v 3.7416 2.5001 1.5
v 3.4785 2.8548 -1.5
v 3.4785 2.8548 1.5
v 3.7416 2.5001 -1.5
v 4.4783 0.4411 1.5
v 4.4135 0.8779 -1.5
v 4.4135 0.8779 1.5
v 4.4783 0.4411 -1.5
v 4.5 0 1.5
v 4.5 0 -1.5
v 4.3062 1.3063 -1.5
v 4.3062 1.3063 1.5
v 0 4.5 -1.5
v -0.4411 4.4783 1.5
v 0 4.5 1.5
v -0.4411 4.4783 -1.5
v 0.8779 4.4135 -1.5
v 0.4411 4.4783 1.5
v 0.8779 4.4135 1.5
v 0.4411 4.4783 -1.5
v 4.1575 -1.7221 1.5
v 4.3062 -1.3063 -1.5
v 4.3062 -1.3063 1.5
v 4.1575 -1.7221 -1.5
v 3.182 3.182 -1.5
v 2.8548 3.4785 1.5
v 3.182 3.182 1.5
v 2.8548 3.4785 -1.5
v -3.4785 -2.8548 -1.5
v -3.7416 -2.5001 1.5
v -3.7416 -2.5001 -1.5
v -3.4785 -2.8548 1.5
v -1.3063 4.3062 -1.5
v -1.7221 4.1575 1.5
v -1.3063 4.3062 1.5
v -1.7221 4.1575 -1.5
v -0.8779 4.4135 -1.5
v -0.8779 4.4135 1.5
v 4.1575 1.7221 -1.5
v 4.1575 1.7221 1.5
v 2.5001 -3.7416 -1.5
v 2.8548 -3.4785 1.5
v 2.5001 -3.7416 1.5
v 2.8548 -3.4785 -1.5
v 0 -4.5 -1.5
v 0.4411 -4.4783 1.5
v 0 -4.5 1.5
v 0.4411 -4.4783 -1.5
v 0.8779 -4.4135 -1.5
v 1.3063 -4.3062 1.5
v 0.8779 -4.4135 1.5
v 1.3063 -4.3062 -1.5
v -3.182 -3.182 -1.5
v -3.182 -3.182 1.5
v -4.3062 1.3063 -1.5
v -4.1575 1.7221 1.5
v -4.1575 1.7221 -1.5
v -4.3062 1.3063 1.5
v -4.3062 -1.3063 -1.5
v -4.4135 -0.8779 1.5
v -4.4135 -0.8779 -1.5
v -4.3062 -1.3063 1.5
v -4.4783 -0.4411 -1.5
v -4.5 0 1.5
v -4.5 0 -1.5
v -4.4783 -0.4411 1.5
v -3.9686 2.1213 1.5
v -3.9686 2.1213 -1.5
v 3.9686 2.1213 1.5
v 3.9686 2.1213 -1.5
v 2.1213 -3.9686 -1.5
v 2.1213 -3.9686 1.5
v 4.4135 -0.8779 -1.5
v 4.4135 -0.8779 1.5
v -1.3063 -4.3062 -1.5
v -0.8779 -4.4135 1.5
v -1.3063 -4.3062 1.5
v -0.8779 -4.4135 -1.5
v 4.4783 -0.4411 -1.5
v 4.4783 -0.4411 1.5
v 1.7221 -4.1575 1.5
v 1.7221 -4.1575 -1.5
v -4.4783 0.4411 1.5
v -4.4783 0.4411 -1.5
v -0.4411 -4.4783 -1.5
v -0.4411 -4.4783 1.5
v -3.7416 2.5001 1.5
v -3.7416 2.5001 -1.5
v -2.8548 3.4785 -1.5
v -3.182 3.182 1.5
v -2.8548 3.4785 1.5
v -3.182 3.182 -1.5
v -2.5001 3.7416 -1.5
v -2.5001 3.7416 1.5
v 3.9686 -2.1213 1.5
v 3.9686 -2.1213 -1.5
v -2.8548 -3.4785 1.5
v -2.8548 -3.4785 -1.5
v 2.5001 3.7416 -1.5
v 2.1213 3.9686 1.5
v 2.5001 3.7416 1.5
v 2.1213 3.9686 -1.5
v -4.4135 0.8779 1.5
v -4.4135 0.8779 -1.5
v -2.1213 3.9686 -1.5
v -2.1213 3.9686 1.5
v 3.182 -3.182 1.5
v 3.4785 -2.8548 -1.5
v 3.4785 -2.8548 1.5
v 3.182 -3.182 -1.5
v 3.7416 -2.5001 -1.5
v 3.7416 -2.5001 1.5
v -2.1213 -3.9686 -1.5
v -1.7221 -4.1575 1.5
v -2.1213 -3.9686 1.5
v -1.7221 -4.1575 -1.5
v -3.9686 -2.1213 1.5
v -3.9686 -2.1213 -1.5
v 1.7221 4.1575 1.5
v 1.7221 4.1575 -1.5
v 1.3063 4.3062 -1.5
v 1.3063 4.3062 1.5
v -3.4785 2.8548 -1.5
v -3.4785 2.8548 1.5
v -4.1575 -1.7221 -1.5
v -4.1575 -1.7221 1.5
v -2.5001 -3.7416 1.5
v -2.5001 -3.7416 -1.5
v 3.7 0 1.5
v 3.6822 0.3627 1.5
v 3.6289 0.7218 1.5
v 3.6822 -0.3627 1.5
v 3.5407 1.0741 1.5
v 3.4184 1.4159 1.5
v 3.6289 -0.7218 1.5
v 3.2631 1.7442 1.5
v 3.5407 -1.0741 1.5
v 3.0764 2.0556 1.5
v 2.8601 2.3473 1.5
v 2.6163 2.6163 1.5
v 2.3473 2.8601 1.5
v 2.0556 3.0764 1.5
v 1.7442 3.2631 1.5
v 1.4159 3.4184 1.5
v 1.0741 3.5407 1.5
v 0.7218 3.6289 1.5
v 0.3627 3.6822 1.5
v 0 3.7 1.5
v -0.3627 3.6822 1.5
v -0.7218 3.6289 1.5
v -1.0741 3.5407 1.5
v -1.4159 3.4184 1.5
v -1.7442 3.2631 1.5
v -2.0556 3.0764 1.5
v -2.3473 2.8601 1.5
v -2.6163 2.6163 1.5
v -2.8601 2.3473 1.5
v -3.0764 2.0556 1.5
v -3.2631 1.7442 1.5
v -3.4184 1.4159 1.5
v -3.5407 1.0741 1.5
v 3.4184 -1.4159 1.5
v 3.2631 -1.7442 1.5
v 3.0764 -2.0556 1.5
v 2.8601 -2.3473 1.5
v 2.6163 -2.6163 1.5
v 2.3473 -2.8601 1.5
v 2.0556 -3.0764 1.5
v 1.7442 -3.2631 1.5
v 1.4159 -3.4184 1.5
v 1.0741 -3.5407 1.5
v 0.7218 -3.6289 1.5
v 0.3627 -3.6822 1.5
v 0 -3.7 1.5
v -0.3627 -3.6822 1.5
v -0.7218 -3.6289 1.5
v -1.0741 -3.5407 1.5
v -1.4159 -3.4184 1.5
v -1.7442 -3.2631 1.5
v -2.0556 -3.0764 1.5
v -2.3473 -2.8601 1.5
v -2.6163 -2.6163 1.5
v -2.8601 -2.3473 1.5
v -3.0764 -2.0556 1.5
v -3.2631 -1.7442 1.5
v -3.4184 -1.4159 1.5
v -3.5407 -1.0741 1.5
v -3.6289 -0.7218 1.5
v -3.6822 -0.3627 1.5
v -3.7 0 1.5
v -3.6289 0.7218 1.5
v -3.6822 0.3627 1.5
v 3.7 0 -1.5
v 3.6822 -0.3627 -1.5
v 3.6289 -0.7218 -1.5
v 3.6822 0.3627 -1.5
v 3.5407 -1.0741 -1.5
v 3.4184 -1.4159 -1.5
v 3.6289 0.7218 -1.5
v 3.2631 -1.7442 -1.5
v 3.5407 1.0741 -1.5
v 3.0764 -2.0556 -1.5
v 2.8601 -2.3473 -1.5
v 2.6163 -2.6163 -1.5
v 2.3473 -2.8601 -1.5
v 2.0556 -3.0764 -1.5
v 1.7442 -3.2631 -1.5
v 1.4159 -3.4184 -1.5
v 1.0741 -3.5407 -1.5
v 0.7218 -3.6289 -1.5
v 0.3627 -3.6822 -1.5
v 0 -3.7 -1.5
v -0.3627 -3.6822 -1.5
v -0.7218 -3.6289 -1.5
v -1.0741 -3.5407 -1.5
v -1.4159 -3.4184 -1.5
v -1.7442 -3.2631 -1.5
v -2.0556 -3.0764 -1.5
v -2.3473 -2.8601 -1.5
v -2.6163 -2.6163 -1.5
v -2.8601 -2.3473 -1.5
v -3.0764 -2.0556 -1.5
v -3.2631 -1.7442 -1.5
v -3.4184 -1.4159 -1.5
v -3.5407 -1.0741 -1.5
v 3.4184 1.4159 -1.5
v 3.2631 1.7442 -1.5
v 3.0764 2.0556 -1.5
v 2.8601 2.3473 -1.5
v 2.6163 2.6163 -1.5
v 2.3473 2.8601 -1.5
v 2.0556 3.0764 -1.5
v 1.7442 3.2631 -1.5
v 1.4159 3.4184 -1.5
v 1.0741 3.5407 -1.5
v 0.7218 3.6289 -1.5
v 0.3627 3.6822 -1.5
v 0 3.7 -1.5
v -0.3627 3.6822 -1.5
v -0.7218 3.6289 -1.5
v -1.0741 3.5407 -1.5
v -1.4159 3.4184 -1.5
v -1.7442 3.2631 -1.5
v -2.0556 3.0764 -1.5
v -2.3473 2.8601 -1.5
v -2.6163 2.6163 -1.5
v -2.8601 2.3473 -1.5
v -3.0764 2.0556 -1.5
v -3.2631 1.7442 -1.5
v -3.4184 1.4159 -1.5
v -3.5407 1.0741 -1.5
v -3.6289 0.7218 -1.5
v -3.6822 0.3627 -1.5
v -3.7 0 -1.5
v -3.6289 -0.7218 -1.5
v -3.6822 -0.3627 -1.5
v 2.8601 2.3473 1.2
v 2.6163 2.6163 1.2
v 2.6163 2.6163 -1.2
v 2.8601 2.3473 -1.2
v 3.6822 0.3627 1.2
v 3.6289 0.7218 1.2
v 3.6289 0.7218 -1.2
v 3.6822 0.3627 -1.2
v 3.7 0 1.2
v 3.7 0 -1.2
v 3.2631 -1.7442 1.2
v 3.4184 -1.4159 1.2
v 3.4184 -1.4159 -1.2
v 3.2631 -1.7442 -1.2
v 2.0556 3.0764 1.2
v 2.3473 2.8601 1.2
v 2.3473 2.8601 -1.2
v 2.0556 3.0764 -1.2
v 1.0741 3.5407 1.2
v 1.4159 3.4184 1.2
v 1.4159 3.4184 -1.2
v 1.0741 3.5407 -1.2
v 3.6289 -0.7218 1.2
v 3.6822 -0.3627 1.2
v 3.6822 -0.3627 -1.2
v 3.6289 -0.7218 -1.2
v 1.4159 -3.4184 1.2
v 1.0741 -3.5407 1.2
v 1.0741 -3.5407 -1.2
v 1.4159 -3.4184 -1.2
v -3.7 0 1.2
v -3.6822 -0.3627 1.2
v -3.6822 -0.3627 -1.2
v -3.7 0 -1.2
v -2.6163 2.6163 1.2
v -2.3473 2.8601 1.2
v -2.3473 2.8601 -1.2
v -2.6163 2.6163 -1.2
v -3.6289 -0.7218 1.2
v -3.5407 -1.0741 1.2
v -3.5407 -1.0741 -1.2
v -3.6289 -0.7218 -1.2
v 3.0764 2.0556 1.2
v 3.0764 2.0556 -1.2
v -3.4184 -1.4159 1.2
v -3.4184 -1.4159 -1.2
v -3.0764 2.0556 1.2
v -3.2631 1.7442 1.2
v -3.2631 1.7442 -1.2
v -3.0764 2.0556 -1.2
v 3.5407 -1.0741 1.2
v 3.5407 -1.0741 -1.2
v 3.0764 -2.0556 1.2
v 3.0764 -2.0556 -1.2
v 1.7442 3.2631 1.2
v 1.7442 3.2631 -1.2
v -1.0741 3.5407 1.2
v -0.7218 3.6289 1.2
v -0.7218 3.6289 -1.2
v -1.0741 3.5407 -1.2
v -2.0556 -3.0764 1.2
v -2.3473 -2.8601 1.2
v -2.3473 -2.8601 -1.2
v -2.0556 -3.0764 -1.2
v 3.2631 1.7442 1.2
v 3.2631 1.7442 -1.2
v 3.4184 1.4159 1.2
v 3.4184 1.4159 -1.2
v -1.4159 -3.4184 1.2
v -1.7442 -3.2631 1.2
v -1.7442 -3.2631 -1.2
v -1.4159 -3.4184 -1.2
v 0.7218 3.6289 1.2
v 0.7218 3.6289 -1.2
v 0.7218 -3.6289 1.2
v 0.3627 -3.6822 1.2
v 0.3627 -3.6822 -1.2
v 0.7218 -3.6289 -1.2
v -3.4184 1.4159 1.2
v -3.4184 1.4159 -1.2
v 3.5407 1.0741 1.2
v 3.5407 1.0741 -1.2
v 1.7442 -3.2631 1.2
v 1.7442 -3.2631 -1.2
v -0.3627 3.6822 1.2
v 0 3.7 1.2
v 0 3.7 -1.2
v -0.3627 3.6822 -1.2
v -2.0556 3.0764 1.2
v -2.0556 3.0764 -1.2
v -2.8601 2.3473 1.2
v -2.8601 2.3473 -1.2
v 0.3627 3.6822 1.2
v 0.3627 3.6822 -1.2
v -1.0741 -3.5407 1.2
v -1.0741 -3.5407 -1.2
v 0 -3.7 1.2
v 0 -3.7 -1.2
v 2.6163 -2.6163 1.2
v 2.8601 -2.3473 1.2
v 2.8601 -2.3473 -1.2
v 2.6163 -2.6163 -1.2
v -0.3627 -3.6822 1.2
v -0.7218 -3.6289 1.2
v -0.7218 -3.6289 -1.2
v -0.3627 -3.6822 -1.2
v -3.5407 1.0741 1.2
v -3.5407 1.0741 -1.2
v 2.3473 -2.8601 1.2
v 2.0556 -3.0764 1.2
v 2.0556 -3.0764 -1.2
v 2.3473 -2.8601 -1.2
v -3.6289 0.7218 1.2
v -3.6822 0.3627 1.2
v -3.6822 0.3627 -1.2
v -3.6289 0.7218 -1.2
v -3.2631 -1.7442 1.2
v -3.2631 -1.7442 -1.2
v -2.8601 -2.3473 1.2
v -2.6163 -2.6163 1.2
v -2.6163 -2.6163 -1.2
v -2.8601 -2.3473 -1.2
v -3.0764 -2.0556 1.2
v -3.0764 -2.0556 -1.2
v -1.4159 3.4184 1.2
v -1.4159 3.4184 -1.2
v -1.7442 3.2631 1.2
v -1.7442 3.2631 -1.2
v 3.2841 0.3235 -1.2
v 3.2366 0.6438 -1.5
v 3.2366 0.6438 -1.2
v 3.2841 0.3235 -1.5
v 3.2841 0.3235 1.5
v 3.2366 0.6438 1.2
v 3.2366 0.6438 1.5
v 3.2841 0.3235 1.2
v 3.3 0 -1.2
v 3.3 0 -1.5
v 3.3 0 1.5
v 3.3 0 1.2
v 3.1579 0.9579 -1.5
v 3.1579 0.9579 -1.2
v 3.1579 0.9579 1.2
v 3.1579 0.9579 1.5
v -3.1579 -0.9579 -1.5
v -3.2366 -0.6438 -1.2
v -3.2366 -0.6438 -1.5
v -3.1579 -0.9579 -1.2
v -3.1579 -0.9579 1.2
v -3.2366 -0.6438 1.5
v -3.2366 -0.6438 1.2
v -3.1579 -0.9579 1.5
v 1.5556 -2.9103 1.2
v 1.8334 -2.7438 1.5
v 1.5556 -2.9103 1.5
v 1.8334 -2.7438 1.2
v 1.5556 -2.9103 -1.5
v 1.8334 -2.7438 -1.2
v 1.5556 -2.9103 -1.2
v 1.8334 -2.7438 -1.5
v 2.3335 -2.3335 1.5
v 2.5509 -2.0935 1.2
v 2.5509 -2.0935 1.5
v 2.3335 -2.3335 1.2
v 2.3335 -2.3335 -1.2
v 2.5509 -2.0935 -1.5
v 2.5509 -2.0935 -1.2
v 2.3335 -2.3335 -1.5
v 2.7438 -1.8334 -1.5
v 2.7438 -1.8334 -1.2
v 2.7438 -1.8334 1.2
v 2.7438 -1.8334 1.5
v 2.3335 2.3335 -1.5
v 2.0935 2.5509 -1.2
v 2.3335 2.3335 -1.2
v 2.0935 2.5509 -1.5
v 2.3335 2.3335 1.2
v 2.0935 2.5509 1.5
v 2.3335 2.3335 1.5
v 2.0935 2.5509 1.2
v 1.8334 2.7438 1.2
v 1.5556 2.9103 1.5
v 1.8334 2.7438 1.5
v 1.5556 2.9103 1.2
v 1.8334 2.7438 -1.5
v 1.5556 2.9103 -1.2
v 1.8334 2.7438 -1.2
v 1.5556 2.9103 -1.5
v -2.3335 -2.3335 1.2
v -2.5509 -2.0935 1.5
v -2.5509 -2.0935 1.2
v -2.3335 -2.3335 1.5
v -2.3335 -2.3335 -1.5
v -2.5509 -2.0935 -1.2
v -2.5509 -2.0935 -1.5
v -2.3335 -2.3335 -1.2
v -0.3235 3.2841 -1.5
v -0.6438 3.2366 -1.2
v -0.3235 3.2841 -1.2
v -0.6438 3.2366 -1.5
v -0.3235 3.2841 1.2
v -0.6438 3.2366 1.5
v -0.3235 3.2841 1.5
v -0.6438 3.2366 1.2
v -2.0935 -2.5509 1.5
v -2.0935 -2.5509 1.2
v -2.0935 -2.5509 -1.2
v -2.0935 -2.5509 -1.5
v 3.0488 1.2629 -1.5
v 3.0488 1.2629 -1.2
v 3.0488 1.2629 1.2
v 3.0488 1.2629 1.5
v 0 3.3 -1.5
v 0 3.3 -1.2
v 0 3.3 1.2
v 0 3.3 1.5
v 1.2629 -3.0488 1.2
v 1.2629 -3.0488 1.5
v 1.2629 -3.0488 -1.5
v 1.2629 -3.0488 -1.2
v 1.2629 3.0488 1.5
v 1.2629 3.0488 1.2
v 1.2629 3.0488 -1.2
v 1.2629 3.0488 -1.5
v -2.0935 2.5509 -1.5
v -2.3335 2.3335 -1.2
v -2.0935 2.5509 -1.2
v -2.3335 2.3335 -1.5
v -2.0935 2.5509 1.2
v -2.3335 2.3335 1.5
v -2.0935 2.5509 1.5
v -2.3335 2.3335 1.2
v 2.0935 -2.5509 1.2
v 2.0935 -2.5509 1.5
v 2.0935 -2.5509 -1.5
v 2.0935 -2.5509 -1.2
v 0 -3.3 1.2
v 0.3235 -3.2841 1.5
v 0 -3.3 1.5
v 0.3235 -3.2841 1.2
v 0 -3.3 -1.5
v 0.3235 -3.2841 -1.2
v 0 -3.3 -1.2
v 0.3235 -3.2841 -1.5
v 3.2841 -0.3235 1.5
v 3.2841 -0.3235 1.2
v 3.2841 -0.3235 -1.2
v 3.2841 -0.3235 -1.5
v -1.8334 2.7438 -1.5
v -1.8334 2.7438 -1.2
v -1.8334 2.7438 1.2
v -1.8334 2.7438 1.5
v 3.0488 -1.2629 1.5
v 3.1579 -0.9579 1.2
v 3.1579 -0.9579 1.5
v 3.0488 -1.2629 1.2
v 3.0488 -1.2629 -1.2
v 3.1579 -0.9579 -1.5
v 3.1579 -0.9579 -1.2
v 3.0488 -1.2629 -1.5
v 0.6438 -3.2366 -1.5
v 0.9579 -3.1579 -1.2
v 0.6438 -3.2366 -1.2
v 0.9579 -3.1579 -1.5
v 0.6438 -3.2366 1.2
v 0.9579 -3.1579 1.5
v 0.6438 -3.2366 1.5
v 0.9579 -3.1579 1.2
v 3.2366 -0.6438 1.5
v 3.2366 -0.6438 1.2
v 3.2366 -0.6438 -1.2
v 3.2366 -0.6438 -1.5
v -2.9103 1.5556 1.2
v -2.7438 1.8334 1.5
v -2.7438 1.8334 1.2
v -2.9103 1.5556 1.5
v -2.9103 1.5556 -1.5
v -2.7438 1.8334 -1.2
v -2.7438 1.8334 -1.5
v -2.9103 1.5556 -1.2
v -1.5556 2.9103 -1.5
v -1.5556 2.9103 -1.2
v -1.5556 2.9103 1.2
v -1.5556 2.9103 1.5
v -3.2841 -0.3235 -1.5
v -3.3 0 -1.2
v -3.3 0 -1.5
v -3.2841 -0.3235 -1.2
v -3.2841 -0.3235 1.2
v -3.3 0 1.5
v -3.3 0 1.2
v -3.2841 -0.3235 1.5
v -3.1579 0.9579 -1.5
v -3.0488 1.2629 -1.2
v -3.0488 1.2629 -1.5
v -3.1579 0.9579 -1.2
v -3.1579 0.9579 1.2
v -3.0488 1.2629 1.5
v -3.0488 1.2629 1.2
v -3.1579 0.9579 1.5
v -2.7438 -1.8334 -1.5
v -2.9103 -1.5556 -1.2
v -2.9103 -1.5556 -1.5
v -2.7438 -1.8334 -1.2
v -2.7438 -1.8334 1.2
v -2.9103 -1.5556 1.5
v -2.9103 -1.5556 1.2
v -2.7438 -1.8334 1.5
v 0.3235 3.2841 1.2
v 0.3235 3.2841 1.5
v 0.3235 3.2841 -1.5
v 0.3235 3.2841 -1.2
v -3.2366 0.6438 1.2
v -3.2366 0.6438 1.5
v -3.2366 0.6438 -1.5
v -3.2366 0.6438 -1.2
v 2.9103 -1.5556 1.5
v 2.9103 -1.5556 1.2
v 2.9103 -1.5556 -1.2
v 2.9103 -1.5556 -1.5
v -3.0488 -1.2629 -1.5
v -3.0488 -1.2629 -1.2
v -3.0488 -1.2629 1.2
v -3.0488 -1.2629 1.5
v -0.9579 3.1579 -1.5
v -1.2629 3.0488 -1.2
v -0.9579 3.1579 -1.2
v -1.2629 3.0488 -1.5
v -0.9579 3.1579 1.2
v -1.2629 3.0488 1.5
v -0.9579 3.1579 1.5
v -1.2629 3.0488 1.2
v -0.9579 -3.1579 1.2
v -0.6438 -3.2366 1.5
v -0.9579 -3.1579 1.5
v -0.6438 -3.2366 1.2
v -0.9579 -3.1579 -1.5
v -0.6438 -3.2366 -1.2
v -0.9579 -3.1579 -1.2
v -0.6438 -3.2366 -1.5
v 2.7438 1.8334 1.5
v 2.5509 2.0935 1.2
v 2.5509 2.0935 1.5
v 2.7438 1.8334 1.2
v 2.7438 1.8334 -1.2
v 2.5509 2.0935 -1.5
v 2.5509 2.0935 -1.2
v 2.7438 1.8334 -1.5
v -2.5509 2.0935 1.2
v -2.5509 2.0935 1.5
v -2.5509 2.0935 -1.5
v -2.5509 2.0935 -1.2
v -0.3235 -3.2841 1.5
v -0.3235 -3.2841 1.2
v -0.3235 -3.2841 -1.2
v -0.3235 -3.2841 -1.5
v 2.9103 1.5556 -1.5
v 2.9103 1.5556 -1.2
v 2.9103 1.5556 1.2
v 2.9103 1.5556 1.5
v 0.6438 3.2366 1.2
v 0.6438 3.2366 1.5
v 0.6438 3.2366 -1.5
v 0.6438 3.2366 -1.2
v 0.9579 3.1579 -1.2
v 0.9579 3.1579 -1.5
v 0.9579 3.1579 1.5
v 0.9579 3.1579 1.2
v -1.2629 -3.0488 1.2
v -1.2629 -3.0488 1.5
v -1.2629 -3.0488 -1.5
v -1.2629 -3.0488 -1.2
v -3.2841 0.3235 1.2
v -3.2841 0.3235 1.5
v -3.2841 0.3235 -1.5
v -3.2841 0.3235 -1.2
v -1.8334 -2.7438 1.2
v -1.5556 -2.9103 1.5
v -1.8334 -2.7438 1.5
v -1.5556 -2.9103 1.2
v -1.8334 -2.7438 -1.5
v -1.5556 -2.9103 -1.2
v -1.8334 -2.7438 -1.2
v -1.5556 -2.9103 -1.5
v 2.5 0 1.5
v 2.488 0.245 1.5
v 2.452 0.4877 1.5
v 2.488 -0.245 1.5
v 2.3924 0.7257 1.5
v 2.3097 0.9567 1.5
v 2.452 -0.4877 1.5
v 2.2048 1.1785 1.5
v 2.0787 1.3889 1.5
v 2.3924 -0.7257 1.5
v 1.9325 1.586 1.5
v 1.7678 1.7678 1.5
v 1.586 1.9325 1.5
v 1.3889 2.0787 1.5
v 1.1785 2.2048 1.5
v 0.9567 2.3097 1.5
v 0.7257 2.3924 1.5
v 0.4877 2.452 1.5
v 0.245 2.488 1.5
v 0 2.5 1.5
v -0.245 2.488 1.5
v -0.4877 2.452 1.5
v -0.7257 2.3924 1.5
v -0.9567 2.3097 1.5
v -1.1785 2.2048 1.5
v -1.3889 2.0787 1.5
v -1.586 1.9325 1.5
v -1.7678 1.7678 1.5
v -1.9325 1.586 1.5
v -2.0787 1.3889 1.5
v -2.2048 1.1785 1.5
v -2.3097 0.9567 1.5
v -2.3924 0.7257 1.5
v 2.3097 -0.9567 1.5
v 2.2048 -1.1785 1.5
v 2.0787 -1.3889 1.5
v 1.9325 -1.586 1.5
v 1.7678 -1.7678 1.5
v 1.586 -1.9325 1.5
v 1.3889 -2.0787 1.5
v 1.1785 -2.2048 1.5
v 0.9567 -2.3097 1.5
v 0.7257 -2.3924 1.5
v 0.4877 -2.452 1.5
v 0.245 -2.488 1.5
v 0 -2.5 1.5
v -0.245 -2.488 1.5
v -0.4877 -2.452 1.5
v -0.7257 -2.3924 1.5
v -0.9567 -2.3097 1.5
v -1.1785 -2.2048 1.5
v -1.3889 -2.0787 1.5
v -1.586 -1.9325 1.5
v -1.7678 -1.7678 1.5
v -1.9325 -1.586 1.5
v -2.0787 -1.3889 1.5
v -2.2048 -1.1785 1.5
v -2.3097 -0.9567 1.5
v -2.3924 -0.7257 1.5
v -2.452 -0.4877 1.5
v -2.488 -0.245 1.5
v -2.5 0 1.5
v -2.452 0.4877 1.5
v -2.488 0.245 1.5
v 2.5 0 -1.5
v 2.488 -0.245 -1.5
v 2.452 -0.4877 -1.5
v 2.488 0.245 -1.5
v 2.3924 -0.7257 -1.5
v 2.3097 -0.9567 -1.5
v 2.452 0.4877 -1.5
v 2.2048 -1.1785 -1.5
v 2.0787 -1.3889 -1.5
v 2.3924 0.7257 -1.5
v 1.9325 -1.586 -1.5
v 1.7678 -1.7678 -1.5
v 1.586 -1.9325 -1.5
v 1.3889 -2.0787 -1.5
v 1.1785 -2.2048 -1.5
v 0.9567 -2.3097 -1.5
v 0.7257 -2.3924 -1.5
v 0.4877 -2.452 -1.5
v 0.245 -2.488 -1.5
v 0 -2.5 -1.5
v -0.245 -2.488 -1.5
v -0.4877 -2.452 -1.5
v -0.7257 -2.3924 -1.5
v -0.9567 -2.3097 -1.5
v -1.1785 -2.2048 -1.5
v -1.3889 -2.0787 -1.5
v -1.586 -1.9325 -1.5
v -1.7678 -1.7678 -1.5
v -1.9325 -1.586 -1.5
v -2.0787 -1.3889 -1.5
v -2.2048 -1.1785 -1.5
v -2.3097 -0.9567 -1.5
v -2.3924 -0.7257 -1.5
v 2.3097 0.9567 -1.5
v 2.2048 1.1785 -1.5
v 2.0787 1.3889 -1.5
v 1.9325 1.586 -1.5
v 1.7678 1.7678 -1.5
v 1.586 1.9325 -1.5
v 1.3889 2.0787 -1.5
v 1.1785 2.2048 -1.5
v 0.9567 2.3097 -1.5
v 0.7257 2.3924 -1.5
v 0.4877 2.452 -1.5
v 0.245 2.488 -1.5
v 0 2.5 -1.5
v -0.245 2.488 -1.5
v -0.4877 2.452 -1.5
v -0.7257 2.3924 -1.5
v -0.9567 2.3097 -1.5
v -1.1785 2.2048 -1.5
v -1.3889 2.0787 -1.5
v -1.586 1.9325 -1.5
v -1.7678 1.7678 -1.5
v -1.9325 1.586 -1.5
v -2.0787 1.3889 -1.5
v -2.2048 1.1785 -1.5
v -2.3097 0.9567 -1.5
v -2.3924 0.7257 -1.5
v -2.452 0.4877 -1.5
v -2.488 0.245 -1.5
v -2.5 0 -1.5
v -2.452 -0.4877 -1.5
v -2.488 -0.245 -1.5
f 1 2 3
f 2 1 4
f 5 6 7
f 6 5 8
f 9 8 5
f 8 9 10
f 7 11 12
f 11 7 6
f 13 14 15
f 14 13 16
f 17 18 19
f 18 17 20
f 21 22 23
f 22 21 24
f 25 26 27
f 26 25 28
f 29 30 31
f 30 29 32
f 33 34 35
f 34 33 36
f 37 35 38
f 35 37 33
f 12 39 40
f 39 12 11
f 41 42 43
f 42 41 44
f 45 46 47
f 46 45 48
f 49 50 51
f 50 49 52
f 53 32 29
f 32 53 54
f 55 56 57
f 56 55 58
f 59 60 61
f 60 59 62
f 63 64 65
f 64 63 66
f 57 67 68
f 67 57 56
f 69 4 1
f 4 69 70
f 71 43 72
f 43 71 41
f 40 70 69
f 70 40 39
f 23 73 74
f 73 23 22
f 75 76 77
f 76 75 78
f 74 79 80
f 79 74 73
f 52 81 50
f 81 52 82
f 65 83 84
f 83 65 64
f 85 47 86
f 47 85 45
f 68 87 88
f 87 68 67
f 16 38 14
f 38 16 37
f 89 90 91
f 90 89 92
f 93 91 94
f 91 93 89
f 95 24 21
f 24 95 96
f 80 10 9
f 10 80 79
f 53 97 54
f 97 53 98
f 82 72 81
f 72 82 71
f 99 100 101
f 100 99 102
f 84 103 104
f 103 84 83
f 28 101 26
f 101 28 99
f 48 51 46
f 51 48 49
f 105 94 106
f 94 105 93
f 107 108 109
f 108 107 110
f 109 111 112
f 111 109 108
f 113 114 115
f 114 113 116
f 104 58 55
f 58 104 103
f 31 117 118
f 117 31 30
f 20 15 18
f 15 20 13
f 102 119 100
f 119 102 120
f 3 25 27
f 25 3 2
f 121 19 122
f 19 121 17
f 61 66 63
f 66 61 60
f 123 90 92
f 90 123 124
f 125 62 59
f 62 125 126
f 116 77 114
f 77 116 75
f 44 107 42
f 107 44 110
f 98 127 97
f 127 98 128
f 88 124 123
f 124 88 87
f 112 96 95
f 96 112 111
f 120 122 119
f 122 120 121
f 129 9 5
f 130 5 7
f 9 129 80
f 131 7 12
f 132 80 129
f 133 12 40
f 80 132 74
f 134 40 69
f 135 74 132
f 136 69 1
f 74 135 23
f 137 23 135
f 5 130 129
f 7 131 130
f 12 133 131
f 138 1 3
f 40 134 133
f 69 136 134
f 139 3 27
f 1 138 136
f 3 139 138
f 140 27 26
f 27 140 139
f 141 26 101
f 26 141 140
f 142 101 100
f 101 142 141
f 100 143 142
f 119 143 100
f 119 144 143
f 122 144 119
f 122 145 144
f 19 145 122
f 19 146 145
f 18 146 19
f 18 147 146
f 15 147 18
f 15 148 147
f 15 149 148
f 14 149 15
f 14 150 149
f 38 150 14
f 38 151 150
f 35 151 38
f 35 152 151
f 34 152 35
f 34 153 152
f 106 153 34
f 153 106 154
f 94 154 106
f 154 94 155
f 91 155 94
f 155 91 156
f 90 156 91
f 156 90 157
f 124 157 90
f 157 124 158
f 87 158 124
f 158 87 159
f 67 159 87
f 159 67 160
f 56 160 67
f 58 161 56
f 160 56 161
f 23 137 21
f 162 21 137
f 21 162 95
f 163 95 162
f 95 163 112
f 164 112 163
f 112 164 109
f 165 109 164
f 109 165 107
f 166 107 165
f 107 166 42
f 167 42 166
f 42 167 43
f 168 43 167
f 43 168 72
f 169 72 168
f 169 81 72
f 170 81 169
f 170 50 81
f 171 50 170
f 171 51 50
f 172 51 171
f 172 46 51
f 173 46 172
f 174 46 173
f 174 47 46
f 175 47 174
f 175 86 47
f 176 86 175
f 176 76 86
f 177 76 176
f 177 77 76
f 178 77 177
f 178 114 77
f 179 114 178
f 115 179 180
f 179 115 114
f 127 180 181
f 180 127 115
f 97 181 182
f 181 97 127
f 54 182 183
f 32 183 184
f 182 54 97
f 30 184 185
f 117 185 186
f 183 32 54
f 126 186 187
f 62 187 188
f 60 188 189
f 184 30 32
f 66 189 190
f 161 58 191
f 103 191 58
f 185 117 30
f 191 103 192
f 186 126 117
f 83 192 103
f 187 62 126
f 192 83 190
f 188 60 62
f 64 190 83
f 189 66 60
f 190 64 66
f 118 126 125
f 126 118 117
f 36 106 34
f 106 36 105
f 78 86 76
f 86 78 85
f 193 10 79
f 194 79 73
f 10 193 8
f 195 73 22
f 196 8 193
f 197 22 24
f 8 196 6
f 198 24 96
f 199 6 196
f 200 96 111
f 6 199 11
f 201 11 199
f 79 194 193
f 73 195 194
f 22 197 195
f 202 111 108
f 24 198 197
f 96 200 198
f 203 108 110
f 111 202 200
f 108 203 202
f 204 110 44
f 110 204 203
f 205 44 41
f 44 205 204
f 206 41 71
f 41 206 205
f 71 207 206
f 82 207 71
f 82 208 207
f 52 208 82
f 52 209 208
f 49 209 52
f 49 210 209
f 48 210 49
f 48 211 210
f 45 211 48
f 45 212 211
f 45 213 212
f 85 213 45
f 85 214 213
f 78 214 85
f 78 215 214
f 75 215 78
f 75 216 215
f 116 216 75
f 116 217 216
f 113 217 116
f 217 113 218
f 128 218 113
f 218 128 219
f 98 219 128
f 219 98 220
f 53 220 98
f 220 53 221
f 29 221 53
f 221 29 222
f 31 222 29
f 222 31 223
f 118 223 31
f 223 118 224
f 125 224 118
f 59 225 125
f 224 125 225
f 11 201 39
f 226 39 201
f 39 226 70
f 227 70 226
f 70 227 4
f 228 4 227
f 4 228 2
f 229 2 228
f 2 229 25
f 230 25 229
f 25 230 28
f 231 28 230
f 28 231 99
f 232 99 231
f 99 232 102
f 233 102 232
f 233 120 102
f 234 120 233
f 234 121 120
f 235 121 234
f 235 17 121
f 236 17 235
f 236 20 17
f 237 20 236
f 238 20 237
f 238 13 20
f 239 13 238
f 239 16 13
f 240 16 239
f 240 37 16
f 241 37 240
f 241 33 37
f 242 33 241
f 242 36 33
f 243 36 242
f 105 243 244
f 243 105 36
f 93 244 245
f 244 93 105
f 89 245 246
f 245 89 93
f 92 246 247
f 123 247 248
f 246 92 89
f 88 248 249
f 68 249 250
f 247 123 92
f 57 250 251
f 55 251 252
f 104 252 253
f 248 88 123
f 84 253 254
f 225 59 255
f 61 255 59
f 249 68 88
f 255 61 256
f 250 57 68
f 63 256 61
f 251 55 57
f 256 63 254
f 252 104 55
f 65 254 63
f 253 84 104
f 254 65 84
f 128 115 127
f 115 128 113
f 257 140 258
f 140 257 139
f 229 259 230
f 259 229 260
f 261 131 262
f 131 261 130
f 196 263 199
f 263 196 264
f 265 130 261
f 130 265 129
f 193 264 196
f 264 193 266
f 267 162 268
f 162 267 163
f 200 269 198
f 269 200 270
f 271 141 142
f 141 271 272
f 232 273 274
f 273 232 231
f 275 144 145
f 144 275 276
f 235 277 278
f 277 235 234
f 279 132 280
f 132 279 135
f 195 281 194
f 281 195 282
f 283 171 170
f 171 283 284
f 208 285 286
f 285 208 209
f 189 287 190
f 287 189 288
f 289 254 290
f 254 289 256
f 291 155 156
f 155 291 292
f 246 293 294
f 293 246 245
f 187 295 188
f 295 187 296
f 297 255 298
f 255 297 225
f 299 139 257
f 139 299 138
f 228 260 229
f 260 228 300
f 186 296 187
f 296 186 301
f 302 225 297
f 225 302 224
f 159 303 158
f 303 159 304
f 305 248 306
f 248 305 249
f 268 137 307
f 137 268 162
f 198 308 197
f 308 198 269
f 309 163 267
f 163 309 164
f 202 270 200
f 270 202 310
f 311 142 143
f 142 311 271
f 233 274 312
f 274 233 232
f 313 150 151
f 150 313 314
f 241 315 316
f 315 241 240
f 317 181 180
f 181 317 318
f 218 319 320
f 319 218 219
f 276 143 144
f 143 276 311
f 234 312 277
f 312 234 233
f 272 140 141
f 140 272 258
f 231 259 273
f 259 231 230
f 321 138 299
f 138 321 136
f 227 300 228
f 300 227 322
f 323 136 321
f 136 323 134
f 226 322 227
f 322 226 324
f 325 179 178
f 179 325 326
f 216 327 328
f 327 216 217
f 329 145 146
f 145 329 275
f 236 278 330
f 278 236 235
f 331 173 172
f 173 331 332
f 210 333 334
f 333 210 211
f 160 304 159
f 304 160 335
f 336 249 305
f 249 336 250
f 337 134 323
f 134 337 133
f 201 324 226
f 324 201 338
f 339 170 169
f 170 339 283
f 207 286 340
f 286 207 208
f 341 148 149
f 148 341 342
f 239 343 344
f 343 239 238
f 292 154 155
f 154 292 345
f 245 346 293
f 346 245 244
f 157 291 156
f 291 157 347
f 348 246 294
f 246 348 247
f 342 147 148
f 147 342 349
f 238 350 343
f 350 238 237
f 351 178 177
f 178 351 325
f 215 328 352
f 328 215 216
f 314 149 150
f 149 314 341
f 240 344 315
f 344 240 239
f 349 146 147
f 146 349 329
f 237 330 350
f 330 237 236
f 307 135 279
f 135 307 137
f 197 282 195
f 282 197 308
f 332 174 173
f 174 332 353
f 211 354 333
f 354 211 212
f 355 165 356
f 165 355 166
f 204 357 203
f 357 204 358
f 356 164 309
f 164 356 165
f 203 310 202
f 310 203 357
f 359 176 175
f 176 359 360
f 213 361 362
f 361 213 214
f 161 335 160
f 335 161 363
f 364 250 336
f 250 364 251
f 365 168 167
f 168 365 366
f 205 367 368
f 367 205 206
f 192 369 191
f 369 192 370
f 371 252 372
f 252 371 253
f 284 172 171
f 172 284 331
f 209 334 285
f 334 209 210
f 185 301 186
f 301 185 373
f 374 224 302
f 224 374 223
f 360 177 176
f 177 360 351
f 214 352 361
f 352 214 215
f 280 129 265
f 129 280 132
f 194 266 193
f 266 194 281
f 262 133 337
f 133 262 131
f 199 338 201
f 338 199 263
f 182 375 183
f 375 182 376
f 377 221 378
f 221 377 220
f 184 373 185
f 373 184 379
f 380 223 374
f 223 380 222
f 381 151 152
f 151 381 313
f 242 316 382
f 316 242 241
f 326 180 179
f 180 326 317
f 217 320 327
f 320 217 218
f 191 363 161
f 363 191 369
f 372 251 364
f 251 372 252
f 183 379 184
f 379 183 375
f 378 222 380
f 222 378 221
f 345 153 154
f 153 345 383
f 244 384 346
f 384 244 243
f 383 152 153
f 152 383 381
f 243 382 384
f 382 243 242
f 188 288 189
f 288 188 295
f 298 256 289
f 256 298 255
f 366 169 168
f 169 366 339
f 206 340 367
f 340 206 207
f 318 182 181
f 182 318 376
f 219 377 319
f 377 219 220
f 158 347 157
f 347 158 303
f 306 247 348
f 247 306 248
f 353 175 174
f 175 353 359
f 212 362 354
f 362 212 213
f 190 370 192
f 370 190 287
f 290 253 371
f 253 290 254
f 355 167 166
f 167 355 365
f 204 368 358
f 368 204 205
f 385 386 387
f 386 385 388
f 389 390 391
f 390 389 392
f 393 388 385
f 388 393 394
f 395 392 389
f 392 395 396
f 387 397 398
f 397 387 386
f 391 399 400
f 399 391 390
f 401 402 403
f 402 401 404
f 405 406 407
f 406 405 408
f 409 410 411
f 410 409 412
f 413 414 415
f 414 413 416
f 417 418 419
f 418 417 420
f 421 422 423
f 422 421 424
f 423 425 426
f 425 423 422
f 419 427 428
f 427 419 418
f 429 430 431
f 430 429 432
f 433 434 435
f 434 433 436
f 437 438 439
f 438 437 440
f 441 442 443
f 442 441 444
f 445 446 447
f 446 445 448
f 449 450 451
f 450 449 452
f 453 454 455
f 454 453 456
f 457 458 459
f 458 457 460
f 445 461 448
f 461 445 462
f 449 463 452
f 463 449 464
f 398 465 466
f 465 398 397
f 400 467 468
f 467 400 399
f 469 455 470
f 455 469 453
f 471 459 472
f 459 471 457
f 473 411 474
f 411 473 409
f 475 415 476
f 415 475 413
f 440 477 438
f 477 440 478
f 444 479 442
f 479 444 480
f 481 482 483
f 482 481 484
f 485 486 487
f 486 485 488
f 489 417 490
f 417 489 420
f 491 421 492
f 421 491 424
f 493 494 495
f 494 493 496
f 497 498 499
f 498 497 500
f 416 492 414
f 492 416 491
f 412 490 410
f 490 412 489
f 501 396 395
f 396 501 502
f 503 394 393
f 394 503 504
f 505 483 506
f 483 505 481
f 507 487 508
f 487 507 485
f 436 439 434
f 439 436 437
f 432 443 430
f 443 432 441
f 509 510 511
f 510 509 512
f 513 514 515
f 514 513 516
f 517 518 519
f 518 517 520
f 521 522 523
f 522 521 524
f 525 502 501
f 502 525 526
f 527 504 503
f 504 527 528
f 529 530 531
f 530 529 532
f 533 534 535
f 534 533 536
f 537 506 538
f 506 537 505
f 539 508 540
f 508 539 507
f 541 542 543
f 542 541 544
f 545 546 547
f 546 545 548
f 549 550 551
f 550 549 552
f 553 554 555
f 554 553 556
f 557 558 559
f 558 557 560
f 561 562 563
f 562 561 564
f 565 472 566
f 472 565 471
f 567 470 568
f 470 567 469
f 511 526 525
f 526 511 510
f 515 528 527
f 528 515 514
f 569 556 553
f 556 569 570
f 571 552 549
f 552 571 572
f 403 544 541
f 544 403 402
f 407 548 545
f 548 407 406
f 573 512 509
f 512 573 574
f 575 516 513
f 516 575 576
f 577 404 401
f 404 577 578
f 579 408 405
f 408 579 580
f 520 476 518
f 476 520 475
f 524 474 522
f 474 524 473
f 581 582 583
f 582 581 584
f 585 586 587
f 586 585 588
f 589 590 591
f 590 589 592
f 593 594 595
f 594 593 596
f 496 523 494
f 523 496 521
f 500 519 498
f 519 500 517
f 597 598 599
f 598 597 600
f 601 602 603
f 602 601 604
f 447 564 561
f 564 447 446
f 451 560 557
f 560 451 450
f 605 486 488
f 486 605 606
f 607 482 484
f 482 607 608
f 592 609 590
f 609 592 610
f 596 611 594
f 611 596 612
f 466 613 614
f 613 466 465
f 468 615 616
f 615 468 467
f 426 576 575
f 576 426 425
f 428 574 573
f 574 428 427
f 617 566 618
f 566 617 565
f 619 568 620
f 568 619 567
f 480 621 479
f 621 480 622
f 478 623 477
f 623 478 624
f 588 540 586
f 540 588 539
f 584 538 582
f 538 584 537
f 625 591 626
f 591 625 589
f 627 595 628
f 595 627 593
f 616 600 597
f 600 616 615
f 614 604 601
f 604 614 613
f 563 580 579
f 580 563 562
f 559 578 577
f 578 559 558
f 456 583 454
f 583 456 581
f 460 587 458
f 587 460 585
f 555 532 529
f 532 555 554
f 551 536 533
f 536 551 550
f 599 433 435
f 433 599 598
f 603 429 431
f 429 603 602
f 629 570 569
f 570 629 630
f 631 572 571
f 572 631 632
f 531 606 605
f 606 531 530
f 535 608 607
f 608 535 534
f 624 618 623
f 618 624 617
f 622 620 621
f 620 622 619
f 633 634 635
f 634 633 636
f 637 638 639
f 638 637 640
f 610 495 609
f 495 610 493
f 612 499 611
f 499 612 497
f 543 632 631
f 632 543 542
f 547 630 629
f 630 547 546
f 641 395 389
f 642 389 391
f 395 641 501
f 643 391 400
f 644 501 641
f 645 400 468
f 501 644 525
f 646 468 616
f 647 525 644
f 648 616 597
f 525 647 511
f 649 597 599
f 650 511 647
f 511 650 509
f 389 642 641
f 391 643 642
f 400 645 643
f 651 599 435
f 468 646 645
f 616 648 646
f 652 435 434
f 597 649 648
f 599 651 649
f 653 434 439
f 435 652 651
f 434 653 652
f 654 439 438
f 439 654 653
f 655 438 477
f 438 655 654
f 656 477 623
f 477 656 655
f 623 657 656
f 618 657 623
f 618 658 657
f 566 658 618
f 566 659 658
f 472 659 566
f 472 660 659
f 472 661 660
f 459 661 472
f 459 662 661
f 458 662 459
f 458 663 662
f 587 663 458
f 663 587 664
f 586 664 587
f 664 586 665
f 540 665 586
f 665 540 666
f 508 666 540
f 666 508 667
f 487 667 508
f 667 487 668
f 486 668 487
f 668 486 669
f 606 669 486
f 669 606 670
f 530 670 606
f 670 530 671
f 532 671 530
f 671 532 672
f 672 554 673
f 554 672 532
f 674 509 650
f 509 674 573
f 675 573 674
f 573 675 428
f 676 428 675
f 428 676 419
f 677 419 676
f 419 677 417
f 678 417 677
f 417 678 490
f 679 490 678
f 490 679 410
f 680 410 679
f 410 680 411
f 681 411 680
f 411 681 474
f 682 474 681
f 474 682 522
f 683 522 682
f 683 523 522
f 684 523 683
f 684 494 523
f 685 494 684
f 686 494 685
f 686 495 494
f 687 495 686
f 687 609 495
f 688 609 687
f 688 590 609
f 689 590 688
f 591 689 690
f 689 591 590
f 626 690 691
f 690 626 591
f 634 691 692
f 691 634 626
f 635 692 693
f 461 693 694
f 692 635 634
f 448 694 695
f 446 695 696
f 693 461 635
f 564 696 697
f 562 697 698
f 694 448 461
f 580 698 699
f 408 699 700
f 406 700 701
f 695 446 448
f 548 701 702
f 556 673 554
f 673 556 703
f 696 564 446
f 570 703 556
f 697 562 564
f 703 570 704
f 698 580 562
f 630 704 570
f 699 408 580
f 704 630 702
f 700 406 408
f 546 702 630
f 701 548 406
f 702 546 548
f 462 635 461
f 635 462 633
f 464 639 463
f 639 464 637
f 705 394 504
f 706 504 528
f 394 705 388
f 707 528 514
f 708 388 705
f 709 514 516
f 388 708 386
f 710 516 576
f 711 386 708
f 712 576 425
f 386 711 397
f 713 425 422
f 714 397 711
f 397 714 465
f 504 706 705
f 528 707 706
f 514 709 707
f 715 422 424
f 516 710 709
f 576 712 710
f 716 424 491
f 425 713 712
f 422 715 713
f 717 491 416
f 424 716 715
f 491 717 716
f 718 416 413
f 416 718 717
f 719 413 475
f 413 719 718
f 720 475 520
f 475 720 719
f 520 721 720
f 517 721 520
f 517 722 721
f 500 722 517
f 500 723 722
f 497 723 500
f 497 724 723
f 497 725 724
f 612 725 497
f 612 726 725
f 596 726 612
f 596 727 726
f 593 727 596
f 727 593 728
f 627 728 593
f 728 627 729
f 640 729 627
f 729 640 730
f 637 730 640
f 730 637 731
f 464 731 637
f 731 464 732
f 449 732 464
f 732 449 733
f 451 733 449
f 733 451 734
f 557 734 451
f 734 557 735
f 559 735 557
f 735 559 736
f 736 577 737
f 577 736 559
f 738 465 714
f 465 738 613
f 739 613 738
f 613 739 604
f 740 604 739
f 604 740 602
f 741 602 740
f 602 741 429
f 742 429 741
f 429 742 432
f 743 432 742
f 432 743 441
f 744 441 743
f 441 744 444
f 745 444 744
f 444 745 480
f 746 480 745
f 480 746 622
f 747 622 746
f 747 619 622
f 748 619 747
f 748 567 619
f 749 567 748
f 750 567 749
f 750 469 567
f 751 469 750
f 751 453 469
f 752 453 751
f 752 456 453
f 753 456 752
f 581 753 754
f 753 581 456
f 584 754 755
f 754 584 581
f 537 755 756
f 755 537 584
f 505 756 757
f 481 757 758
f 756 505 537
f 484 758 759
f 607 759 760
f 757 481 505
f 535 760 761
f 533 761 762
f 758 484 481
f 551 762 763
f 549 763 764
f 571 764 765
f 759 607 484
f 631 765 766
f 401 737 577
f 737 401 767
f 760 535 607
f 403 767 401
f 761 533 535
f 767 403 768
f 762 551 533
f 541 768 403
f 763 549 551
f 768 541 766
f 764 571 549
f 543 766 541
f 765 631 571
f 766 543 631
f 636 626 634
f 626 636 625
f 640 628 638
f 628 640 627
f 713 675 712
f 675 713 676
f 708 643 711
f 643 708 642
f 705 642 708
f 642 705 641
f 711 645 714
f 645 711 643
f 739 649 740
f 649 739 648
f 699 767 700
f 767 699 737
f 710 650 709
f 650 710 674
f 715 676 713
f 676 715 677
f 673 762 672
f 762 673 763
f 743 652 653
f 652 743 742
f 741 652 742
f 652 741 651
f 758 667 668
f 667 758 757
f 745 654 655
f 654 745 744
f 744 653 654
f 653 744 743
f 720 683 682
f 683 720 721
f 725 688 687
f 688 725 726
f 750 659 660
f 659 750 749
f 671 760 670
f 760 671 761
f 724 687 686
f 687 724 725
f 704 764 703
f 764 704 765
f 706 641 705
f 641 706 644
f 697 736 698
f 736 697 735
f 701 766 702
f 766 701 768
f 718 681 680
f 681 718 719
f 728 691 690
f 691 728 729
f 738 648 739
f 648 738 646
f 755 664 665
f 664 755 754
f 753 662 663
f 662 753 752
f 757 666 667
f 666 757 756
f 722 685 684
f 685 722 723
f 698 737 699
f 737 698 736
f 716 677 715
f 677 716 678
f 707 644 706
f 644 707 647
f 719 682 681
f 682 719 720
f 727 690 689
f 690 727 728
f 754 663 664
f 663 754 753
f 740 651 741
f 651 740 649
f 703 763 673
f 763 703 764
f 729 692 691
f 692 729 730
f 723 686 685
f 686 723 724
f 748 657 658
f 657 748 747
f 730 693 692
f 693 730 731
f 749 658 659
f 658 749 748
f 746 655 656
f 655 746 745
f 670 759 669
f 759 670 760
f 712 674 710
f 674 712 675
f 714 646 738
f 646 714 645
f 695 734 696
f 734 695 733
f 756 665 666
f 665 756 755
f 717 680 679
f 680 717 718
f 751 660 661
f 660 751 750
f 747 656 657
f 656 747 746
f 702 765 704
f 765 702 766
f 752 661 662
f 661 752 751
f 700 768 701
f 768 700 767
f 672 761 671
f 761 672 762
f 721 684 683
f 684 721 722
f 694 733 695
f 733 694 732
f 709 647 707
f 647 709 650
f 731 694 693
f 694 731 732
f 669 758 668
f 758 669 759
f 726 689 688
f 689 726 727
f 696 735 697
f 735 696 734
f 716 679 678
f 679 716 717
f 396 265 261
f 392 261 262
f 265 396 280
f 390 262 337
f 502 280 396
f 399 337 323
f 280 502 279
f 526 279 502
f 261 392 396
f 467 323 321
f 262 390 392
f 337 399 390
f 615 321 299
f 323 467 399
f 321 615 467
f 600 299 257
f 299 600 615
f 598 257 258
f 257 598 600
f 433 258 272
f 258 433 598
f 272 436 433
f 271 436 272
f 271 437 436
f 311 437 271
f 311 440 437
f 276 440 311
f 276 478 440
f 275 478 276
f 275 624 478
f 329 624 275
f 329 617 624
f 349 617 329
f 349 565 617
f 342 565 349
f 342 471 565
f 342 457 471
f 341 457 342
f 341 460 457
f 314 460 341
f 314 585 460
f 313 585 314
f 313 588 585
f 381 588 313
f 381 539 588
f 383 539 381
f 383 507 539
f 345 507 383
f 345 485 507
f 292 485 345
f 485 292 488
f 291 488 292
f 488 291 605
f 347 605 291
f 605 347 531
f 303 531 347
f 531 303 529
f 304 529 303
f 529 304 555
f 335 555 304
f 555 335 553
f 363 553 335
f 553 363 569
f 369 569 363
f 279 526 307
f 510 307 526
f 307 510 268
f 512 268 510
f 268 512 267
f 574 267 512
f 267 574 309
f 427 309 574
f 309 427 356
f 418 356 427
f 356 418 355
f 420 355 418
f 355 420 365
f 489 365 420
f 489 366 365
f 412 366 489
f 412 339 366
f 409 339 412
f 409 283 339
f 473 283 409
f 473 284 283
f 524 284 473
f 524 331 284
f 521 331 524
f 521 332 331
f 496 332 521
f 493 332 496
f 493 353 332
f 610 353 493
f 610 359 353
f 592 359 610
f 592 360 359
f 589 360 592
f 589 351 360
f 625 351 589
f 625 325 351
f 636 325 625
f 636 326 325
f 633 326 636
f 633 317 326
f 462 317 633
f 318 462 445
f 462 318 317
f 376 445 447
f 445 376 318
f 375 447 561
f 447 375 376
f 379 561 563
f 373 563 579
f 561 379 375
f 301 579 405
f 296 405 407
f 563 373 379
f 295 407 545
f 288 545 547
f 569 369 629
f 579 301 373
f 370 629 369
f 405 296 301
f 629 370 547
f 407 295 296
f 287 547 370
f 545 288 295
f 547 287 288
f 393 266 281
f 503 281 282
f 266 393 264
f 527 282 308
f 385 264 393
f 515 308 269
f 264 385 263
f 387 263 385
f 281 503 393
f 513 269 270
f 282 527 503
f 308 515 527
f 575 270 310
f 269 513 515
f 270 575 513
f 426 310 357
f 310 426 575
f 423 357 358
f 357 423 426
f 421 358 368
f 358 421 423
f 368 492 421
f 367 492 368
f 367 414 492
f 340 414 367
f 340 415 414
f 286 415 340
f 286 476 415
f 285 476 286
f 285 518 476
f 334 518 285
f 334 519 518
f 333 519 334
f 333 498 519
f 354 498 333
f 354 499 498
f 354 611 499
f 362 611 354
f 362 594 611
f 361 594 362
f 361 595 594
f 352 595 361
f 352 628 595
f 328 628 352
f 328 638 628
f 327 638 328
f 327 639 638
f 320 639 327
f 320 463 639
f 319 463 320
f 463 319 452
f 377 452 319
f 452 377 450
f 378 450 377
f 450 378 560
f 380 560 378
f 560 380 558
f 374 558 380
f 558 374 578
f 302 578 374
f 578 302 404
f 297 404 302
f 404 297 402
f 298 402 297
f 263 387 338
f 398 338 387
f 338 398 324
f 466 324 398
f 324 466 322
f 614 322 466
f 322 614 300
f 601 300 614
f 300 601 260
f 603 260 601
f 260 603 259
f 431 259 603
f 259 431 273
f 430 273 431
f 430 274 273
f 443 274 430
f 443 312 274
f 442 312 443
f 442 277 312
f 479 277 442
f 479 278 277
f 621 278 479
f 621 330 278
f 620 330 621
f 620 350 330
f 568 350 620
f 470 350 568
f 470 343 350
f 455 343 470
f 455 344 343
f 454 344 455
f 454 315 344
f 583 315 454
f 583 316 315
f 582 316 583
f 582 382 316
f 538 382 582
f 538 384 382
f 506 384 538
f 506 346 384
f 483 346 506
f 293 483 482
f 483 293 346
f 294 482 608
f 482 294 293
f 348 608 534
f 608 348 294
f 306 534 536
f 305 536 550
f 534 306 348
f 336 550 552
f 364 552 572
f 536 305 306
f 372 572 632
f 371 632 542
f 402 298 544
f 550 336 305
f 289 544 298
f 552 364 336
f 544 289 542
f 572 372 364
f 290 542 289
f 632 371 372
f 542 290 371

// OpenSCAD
// Parameters
bore_diameter_mm = 5.0; //[2.5:10.0:0.1]
outer_diameter_mm = 9.0; //[4.5:18.0:0.1]
width_mm = 3.0; //[1.5:6.0:0.1]
bore_radius_mm = 2.5; //[1.25:5.0:0.05]
outer_radius_mm = 4.5; //[2.25:9.0:0.05]
race_radial_thickness_mm = 0.8; //[0.4:1.6:0.05]
shield_thickness_mm = 0.4; //[0.2:0.8:0.05]
shield_width_mm = 2.4; //[1.2:3.0:0.05]
ball_diameter_mm = 0.9; //[0.5:1.6:0.05]
ball_count = 8; //[6:12:1]
overlap_mm = 0.6; //[0.2:1.2:0.05]

// Bearing Ball - complete geometry
module bearing_ball() {
  color("Silver") {
    sphere(r=ball_diameter_mm/2, $fn=32);
  }
}

// Ball Bearing - complete geometry
module ball_bearing() {
  color("DimGray") {
    // Outer Race
    difference() {
      cylinder(r=outer_radius_mm, h=width_mm, center=true, $fn=64);
      cylinder(r=outer_radius_mm - race_radial_thickness_mm, h=width_mm + 2*overlap_mm, center=true, $fn=64);
    }
    // Inner Race
    difference() {
      cylinder(r=bore_radius_mm + race_radial_thickness_mm, h=width_mm, center=true, $fn=64);
      cylinder(r=bore_radius_mm, h=width_mm + 2*overlap_mm, center=true, $fn=64);
    }
    // Shield Seal Annulus
    difference() {
      cylinder(r=outer_radius_mm - race_radial_thickness_mm + overlap_mm, h=shield_width_mm, center=true, $fn=64);
      cylinder(r=bore_radius_mm + race_radial_thickness_mm - overlap_mm, h=shield_width_mm + 2*overlap_mm, center=true, $fn=64);
    }
    // Bearing Balls
    for (i = [0:ball_count-1]) {
      rotate([0, 0, i*360/ball_count]) 
        translate([((bore_radius_mm + race_radial_thickness_mm) + (outer_radius_mm - race_radial_thickness_mm))/2, 0, 0])
        bearing_ball();
    }
  }
}

// Assembly
module assembly() {
  ball_bearing();
}

assembly();
